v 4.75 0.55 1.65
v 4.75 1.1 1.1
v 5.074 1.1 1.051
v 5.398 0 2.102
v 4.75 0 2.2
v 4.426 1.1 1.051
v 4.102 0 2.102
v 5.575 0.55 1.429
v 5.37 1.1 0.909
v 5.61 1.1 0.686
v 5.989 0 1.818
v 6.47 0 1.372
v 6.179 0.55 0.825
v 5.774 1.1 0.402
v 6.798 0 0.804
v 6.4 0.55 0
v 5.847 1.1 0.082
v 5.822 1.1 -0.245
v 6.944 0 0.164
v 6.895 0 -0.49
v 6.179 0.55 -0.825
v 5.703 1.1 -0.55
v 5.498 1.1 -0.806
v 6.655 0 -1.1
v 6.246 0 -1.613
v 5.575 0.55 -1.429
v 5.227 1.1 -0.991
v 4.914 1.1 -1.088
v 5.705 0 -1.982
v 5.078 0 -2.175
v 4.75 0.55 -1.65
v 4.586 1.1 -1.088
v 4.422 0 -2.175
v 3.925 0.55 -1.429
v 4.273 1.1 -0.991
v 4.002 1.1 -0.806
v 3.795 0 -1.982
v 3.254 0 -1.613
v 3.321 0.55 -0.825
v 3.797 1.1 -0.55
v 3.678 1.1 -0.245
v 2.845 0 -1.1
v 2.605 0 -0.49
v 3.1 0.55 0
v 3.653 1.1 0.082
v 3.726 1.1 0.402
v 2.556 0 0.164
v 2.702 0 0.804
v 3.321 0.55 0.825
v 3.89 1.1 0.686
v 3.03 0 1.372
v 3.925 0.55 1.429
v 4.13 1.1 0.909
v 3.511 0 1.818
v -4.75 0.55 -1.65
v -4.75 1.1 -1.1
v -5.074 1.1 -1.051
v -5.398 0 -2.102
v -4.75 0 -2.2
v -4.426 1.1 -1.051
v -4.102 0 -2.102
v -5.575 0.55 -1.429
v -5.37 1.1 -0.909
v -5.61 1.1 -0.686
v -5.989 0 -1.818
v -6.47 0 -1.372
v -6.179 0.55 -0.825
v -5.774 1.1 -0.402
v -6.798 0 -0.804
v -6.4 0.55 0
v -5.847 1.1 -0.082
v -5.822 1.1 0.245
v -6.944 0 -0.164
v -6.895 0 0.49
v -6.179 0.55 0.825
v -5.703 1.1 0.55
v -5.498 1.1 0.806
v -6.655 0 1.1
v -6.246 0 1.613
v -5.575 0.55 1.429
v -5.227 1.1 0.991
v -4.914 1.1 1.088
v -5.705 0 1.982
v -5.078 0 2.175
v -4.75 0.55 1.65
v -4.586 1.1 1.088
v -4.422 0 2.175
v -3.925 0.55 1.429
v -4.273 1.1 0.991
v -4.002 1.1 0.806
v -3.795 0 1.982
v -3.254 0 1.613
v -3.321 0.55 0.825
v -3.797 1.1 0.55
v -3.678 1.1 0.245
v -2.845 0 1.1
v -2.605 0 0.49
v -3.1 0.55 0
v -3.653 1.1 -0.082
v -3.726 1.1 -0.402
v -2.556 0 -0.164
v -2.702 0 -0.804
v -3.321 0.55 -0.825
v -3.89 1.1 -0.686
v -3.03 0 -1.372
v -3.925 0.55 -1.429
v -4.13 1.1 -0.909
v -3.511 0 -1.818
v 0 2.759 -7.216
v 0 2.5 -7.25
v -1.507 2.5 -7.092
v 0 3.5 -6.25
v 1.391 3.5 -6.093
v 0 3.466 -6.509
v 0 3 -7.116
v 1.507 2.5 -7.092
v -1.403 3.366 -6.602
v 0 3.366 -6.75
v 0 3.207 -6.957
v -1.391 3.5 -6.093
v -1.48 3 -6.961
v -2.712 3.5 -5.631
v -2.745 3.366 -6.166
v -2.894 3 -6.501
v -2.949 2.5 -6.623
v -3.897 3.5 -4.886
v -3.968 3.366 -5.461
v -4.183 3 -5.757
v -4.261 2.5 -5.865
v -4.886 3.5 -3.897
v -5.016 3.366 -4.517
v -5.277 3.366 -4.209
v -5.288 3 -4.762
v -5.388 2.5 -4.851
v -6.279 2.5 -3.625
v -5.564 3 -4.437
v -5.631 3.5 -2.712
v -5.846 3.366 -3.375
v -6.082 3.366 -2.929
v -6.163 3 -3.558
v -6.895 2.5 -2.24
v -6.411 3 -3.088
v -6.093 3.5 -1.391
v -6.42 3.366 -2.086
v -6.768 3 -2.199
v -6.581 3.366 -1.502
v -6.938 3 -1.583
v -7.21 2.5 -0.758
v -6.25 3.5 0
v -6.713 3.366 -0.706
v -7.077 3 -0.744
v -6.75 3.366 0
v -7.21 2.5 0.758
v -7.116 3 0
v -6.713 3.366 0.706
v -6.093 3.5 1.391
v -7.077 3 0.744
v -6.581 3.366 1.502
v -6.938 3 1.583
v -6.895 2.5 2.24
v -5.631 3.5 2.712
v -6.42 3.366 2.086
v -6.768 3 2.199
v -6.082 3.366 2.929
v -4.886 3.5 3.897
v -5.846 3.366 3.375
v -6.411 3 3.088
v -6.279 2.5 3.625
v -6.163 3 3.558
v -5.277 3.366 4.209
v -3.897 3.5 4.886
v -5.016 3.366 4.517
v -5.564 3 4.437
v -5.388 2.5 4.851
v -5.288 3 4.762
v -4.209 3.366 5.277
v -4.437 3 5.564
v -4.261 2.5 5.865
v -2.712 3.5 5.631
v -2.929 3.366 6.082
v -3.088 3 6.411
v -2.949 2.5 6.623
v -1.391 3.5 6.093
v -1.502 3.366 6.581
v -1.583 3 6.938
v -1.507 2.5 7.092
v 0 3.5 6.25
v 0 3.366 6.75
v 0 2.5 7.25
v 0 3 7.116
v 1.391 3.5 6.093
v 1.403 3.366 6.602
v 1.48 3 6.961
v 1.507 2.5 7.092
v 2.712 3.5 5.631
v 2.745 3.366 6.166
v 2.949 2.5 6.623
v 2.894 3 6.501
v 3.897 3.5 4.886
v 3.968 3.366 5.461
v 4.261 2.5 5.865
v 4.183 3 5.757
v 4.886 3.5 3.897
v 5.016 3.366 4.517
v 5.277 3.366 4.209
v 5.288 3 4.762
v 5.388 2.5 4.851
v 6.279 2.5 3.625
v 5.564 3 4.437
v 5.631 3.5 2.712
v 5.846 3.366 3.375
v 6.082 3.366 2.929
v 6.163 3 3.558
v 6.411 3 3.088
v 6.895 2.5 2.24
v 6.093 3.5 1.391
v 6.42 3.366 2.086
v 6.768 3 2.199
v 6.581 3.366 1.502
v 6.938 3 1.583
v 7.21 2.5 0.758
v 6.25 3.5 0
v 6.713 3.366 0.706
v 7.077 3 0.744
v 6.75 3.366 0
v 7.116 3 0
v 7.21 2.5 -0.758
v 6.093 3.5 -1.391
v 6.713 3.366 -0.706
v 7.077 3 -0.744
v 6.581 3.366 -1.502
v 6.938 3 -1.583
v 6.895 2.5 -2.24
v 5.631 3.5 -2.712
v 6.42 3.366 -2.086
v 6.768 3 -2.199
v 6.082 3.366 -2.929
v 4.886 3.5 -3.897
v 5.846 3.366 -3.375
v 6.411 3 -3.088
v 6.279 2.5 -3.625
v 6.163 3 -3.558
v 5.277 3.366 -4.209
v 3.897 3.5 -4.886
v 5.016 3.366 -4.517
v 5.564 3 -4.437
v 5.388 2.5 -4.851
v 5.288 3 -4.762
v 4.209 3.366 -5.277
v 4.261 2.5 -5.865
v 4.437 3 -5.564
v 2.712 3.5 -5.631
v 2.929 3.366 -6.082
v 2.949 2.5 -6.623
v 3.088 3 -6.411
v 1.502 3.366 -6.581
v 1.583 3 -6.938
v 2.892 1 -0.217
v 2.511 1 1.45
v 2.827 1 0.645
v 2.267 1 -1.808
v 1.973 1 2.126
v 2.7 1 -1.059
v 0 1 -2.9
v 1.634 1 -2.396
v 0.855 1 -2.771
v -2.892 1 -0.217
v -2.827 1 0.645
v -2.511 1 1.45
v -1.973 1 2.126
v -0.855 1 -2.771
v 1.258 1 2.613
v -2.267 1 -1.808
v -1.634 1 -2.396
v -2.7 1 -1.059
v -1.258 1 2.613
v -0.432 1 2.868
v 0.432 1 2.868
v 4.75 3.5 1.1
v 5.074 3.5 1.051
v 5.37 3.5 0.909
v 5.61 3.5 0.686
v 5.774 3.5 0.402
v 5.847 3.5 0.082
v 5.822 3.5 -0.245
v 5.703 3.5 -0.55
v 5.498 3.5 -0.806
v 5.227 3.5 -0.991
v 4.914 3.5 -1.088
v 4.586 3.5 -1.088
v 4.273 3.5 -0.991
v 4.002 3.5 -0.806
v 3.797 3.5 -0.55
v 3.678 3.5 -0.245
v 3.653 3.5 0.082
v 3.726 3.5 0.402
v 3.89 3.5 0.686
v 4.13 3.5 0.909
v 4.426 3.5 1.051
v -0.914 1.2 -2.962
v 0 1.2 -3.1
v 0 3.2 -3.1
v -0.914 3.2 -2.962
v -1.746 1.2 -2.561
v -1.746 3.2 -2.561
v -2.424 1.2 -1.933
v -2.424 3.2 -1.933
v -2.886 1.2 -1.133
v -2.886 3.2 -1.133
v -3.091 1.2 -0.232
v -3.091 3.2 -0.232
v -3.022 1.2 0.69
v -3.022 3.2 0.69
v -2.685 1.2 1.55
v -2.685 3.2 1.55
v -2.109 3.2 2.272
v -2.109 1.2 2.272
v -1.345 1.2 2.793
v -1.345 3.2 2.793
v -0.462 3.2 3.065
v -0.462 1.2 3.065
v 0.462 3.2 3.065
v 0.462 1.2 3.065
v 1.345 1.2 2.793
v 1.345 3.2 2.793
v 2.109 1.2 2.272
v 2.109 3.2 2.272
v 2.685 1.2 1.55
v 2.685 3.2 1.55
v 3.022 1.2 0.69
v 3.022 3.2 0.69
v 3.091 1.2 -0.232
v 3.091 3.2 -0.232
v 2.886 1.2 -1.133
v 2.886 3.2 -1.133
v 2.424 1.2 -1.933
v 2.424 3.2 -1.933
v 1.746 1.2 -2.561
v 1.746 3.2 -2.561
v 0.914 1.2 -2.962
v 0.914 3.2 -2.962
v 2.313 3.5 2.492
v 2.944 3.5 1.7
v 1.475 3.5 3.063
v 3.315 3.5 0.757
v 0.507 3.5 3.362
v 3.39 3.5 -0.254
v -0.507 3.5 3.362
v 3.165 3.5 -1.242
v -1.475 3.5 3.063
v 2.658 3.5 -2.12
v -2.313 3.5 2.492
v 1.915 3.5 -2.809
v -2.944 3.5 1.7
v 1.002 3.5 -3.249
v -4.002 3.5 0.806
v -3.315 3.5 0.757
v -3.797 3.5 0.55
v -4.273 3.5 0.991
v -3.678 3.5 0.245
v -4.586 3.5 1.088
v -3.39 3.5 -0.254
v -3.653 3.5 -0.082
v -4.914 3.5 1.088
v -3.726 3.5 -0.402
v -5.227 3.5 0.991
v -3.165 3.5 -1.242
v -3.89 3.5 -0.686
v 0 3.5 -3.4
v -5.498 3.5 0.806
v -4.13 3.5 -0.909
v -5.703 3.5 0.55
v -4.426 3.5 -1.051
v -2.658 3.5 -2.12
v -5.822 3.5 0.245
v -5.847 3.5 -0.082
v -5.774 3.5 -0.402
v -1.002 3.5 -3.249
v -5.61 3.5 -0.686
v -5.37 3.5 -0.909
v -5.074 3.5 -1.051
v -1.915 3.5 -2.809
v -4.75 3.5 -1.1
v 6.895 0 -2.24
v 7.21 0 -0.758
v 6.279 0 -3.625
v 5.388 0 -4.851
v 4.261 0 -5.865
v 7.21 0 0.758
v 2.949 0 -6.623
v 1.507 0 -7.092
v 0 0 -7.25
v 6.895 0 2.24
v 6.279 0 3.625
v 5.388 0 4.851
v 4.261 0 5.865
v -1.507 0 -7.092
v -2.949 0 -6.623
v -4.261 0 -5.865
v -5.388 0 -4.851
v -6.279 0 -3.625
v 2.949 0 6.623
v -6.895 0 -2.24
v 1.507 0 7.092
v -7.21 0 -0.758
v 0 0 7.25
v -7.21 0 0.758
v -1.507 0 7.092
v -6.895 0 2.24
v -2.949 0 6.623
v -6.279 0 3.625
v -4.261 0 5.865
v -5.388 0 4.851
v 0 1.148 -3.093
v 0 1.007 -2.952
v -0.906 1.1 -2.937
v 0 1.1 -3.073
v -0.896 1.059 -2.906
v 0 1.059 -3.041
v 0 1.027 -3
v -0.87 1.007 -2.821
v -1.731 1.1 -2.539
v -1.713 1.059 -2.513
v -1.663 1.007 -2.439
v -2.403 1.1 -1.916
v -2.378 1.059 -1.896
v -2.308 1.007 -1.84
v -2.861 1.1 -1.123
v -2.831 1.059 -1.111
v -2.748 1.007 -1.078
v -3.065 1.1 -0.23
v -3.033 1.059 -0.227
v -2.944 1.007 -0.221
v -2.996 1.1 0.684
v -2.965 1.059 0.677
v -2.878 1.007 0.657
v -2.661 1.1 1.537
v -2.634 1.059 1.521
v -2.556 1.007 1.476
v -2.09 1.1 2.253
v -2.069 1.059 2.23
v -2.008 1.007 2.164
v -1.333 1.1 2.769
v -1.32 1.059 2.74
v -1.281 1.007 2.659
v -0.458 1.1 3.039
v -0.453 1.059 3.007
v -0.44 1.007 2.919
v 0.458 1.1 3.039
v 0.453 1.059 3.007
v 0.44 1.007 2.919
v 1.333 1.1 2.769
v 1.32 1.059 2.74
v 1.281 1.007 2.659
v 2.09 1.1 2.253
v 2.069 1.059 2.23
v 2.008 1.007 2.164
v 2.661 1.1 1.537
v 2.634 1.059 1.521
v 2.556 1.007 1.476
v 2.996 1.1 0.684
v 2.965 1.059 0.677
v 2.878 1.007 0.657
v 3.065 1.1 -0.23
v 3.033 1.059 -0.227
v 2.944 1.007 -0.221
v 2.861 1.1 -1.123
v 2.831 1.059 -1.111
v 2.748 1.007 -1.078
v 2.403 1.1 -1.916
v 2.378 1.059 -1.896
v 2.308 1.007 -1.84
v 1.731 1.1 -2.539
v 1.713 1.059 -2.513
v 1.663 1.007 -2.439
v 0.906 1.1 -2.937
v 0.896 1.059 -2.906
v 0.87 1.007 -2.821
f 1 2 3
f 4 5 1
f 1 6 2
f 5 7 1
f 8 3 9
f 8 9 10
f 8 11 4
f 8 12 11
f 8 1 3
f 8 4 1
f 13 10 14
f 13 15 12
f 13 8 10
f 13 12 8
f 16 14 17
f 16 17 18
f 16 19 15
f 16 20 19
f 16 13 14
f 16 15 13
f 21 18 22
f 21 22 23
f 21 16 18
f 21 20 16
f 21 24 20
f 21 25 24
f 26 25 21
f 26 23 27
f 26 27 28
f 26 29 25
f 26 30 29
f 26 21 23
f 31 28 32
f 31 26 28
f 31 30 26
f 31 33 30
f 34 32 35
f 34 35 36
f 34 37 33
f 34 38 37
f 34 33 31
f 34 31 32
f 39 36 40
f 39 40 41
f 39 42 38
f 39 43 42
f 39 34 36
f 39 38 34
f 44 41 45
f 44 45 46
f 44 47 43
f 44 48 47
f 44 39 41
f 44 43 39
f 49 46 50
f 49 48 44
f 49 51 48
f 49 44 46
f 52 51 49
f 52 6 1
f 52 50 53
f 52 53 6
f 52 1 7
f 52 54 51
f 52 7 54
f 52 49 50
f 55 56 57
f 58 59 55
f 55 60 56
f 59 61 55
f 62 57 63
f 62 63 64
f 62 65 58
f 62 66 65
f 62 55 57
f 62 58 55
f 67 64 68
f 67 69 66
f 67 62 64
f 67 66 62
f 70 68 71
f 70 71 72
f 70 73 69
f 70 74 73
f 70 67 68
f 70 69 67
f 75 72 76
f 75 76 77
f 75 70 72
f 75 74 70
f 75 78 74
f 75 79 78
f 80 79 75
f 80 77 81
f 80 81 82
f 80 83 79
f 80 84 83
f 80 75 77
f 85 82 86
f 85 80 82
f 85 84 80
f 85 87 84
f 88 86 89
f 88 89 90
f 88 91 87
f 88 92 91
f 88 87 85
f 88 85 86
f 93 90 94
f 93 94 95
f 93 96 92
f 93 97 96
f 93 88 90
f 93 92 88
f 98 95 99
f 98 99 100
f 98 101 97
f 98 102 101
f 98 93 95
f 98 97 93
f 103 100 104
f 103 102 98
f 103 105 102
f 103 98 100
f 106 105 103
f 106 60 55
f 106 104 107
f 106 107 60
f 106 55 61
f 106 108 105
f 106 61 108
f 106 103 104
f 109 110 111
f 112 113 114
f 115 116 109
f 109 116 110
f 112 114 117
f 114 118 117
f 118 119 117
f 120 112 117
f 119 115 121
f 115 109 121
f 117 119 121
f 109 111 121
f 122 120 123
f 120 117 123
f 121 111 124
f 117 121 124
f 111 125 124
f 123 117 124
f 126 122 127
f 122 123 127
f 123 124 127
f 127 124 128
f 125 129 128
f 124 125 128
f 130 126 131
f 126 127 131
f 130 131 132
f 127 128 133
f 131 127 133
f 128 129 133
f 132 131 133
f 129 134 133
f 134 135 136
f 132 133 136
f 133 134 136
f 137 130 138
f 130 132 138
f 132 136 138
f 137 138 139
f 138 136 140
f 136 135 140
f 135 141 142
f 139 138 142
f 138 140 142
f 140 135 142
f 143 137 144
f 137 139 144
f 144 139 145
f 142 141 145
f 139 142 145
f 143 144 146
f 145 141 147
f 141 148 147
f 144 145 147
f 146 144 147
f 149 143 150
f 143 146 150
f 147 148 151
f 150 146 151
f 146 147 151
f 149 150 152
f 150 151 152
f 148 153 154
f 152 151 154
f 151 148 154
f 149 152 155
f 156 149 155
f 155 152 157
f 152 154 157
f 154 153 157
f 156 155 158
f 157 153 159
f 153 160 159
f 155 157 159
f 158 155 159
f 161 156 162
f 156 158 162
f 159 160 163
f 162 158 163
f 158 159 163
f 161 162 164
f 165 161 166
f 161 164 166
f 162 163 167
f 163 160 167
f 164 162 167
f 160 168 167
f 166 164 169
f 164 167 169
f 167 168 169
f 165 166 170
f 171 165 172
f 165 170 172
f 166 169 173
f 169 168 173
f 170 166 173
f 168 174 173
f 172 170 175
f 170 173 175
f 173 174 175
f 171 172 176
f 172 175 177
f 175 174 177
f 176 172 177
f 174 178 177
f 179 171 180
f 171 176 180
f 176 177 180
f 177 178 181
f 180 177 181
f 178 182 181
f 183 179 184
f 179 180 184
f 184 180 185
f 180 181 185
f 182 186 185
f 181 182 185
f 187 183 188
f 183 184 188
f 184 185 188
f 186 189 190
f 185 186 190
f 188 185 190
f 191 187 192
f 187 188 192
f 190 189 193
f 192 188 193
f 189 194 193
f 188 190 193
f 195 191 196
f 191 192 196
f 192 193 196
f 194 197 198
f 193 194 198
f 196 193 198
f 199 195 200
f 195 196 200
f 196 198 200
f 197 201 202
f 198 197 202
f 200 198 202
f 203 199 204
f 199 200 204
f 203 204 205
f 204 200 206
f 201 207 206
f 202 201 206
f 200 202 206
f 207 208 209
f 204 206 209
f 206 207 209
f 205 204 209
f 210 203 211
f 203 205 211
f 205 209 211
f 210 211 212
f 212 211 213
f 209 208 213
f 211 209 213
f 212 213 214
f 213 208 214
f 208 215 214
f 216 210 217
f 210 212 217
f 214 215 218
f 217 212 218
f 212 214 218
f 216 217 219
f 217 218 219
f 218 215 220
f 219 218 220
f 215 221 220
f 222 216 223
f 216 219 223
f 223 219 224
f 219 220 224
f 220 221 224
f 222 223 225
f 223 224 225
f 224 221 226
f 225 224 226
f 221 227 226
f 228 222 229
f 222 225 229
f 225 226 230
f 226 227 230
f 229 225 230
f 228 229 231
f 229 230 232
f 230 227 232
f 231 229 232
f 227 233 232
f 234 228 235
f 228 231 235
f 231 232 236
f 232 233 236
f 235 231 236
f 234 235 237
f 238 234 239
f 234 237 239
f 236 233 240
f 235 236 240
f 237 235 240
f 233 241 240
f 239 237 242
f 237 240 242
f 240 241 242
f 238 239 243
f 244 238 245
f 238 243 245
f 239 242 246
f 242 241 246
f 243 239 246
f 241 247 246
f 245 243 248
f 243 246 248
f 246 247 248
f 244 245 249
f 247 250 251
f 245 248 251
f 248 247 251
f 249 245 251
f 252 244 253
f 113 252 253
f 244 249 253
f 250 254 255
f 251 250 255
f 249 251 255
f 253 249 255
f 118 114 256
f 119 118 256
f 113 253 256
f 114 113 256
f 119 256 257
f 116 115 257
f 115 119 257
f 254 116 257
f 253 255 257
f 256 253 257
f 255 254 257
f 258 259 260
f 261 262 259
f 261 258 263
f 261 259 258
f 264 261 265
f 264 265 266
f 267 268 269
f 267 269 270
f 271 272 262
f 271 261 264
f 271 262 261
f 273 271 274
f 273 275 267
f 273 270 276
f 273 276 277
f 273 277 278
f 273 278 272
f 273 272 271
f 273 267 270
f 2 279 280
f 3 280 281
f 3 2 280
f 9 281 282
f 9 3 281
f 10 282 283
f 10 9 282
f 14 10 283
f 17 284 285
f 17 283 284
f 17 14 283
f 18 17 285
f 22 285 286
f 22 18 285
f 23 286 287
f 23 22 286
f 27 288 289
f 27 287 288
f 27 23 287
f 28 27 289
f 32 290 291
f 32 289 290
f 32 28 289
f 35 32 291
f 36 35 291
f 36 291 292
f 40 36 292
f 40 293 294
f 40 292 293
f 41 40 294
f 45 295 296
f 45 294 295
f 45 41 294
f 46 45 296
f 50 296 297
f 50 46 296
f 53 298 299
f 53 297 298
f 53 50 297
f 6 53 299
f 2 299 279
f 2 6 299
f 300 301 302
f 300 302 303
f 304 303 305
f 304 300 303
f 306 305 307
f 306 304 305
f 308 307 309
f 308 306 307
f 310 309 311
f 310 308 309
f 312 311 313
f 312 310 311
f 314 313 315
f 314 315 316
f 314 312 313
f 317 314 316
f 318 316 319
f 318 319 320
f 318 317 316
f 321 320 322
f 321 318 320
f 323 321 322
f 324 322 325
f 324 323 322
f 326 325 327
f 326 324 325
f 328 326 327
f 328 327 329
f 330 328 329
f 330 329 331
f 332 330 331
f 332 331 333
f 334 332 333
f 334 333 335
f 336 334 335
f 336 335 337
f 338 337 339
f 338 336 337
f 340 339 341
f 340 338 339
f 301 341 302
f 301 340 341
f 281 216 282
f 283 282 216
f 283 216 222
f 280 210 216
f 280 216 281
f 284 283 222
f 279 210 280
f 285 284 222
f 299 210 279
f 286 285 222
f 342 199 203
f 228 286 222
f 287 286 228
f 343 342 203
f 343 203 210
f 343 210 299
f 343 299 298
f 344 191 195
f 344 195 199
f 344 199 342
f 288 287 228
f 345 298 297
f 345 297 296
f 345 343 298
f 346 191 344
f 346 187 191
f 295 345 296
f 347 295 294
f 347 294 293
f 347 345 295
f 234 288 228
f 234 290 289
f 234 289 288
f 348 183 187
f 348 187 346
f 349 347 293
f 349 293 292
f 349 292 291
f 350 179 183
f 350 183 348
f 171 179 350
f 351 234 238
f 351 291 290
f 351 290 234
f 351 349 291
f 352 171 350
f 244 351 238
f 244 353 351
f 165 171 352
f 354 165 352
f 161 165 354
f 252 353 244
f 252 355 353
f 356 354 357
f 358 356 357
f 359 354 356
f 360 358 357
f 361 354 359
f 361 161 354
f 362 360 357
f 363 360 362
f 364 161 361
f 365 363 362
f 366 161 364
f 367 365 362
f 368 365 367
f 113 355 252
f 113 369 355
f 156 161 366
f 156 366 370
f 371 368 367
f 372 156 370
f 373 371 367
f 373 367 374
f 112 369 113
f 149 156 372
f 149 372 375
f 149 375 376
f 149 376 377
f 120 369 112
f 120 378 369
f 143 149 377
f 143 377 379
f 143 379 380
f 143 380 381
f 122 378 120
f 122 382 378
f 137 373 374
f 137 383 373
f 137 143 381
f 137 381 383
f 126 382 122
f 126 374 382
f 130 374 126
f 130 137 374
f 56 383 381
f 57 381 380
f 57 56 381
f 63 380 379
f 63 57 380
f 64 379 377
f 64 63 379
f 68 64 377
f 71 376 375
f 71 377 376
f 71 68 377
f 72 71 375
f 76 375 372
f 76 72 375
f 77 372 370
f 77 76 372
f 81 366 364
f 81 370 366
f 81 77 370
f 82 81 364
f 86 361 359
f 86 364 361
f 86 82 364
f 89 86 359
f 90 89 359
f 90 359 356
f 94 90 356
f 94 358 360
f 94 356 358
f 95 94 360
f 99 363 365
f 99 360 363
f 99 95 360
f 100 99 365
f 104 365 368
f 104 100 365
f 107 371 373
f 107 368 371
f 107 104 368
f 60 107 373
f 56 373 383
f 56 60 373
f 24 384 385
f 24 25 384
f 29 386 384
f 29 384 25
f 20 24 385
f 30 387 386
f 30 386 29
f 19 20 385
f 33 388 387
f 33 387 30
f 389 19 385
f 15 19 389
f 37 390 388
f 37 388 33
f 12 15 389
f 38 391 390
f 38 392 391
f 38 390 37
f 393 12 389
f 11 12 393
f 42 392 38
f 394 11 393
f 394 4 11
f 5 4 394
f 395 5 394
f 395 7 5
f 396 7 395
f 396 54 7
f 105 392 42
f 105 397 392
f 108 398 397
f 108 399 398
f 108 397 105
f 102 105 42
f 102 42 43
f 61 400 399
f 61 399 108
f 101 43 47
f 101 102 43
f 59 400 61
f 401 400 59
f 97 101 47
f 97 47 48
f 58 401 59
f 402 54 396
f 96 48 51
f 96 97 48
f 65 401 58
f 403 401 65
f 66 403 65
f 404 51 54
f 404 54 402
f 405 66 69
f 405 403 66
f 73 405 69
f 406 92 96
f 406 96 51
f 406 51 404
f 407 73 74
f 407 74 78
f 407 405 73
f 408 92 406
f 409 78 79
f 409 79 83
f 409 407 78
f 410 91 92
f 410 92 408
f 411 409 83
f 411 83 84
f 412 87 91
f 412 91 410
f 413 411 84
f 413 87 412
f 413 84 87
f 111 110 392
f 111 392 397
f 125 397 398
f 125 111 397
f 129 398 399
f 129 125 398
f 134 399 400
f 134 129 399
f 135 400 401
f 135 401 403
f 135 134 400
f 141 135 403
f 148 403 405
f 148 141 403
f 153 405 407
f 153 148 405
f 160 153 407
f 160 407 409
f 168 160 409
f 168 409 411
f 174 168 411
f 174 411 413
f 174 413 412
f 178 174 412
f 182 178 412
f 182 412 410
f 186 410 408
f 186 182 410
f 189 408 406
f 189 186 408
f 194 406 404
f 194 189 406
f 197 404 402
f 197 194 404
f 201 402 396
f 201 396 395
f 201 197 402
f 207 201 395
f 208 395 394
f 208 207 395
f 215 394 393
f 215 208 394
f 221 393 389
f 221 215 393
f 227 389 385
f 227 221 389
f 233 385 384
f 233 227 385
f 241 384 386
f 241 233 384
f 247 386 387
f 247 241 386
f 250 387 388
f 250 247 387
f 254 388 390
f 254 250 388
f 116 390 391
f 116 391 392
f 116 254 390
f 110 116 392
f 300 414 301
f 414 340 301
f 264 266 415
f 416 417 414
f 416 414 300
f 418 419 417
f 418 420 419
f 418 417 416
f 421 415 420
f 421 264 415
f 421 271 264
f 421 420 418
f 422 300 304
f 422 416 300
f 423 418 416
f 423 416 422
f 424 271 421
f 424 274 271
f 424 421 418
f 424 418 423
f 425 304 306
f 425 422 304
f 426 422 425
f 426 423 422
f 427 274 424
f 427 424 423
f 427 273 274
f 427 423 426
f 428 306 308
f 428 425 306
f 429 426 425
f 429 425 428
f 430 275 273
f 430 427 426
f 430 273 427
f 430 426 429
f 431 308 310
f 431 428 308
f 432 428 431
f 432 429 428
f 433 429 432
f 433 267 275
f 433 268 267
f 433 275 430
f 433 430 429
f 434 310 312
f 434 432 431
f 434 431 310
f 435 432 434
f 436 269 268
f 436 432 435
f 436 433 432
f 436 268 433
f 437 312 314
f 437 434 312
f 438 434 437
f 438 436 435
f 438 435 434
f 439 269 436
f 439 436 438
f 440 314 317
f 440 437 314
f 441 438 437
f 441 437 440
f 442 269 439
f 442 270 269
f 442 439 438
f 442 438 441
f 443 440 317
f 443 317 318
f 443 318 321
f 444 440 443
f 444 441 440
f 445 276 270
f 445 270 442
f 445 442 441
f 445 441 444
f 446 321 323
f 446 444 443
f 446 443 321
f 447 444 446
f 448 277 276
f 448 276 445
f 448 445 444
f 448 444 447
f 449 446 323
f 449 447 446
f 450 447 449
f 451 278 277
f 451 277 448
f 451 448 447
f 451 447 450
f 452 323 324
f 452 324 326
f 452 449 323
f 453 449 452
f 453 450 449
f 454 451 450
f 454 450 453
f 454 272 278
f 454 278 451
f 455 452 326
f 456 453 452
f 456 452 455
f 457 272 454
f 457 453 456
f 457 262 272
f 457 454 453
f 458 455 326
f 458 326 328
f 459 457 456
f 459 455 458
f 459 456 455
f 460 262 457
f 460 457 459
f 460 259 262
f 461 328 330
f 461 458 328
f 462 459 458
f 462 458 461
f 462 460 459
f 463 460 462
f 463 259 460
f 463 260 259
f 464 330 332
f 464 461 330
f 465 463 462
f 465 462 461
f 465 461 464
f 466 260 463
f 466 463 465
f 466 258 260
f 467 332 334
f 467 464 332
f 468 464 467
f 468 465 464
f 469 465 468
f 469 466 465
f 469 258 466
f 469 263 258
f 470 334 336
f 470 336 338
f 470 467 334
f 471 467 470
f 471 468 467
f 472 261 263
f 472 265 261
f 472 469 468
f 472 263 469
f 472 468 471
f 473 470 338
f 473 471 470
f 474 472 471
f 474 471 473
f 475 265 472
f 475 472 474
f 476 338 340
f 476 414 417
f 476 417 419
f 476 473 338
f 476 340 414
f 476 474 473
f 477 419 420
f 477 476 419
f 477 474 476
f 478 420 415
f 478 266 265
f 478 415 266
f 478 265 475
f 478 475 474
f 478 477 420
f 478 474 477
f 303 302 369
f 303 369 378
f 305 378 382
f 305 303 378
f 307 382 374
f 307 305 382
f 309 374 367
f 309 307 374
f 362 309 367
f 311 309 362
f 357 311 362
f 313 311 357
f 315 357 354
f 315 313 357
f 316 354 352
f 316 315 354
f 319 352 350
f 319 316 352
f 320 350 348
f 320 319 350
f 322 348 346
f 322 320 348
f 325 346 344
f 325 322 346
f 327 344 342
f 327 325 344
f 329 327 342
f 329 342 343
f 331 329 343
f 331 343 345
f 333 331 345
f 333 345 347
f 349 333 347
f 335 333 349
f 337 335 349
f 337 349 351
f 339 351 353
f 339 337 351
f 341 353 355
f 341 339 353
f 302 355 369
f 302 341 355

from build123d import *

# Parameters (mm, degrees)
CHAMFER2_SIZE     = 0.3
CIRPATTERN1_COUNT = 2
FILLET2_R         = 0.2
FILLET3_R         = 1


with BuildPart() as part:
    # Sketch1 → Revolve1 (revolve)
    with BuildSketch(Plane.XY, mode=Mode.PRIVATE) as revolve1_sk:
        Polygon((0, 0), (-7.25, 0), (-7.25, 3.5), (-3.1, 3.5), (-3.1, 1), (0, 1), align=None)
    revolve(revolve1_sk.sketch.rotate(Axis((0, 0, 0), (0, 1, 0)), 270), axis=Axis((0, 0, 0), (0, 1, 0)))

    # Chamfer2
    chamfer2_edges = [part.edges().sort_by_distance(p)[0] for p in [
        (0, 3.5, 3.1),
    ]]
    chamfer(chamfer2_edges, length=CHAMFER2_SIZE)

    # Sketch4 → CSK for M2 Flat Head Machine Screw1 (revolve, cut)
    with BuildSketch(Plane(origin=(-4.75, 0, 0), x_dir=(0, 0, -1), z_dir=(1, 0, 0))):
        Polygon((0, 0), (0, 5.660946681), (1.1, 5), (1.1, 1.1), (2.2, 0), align=None)
    csk_for_m2_flat_head_machine_screw1 = revolve(axis=Axis((-4.75, -6.35, 0), (0, 1, 0)), mode=Mode.SUBTRACT)

    # CirPattern1: CSK for M2 Flat Head Machine Screw1 ×2 about axis
    cirpattern1_axis = Axis((0, 0, 0), (0, 1, 0))
    for i in range(1, CIRPATTERN1_COUNT):
        add(csk_for_m2_flat_head_machine_screw1.rotate(cirpattern1_axis, i * 360 / CIRPATTERN1_COUNT), mode=Mode.SUBTRACT)

    # Fillet2
    fillet2_edges = [part.edges().sort_by_distance(p)[0] for p in [
        (0, 1, 3.1),
    ]]
    fillet(fillet2_edges, radius=FILLET2_R)

    # Fillet3
    fillet3_edges = [part.edges().sort_by_distance(p)[0] for p in [
        (0, 3.5, 7.25),
    ]]
    fillet(fillet3_edges, radius=FILLET3_R)


solid = part.part
